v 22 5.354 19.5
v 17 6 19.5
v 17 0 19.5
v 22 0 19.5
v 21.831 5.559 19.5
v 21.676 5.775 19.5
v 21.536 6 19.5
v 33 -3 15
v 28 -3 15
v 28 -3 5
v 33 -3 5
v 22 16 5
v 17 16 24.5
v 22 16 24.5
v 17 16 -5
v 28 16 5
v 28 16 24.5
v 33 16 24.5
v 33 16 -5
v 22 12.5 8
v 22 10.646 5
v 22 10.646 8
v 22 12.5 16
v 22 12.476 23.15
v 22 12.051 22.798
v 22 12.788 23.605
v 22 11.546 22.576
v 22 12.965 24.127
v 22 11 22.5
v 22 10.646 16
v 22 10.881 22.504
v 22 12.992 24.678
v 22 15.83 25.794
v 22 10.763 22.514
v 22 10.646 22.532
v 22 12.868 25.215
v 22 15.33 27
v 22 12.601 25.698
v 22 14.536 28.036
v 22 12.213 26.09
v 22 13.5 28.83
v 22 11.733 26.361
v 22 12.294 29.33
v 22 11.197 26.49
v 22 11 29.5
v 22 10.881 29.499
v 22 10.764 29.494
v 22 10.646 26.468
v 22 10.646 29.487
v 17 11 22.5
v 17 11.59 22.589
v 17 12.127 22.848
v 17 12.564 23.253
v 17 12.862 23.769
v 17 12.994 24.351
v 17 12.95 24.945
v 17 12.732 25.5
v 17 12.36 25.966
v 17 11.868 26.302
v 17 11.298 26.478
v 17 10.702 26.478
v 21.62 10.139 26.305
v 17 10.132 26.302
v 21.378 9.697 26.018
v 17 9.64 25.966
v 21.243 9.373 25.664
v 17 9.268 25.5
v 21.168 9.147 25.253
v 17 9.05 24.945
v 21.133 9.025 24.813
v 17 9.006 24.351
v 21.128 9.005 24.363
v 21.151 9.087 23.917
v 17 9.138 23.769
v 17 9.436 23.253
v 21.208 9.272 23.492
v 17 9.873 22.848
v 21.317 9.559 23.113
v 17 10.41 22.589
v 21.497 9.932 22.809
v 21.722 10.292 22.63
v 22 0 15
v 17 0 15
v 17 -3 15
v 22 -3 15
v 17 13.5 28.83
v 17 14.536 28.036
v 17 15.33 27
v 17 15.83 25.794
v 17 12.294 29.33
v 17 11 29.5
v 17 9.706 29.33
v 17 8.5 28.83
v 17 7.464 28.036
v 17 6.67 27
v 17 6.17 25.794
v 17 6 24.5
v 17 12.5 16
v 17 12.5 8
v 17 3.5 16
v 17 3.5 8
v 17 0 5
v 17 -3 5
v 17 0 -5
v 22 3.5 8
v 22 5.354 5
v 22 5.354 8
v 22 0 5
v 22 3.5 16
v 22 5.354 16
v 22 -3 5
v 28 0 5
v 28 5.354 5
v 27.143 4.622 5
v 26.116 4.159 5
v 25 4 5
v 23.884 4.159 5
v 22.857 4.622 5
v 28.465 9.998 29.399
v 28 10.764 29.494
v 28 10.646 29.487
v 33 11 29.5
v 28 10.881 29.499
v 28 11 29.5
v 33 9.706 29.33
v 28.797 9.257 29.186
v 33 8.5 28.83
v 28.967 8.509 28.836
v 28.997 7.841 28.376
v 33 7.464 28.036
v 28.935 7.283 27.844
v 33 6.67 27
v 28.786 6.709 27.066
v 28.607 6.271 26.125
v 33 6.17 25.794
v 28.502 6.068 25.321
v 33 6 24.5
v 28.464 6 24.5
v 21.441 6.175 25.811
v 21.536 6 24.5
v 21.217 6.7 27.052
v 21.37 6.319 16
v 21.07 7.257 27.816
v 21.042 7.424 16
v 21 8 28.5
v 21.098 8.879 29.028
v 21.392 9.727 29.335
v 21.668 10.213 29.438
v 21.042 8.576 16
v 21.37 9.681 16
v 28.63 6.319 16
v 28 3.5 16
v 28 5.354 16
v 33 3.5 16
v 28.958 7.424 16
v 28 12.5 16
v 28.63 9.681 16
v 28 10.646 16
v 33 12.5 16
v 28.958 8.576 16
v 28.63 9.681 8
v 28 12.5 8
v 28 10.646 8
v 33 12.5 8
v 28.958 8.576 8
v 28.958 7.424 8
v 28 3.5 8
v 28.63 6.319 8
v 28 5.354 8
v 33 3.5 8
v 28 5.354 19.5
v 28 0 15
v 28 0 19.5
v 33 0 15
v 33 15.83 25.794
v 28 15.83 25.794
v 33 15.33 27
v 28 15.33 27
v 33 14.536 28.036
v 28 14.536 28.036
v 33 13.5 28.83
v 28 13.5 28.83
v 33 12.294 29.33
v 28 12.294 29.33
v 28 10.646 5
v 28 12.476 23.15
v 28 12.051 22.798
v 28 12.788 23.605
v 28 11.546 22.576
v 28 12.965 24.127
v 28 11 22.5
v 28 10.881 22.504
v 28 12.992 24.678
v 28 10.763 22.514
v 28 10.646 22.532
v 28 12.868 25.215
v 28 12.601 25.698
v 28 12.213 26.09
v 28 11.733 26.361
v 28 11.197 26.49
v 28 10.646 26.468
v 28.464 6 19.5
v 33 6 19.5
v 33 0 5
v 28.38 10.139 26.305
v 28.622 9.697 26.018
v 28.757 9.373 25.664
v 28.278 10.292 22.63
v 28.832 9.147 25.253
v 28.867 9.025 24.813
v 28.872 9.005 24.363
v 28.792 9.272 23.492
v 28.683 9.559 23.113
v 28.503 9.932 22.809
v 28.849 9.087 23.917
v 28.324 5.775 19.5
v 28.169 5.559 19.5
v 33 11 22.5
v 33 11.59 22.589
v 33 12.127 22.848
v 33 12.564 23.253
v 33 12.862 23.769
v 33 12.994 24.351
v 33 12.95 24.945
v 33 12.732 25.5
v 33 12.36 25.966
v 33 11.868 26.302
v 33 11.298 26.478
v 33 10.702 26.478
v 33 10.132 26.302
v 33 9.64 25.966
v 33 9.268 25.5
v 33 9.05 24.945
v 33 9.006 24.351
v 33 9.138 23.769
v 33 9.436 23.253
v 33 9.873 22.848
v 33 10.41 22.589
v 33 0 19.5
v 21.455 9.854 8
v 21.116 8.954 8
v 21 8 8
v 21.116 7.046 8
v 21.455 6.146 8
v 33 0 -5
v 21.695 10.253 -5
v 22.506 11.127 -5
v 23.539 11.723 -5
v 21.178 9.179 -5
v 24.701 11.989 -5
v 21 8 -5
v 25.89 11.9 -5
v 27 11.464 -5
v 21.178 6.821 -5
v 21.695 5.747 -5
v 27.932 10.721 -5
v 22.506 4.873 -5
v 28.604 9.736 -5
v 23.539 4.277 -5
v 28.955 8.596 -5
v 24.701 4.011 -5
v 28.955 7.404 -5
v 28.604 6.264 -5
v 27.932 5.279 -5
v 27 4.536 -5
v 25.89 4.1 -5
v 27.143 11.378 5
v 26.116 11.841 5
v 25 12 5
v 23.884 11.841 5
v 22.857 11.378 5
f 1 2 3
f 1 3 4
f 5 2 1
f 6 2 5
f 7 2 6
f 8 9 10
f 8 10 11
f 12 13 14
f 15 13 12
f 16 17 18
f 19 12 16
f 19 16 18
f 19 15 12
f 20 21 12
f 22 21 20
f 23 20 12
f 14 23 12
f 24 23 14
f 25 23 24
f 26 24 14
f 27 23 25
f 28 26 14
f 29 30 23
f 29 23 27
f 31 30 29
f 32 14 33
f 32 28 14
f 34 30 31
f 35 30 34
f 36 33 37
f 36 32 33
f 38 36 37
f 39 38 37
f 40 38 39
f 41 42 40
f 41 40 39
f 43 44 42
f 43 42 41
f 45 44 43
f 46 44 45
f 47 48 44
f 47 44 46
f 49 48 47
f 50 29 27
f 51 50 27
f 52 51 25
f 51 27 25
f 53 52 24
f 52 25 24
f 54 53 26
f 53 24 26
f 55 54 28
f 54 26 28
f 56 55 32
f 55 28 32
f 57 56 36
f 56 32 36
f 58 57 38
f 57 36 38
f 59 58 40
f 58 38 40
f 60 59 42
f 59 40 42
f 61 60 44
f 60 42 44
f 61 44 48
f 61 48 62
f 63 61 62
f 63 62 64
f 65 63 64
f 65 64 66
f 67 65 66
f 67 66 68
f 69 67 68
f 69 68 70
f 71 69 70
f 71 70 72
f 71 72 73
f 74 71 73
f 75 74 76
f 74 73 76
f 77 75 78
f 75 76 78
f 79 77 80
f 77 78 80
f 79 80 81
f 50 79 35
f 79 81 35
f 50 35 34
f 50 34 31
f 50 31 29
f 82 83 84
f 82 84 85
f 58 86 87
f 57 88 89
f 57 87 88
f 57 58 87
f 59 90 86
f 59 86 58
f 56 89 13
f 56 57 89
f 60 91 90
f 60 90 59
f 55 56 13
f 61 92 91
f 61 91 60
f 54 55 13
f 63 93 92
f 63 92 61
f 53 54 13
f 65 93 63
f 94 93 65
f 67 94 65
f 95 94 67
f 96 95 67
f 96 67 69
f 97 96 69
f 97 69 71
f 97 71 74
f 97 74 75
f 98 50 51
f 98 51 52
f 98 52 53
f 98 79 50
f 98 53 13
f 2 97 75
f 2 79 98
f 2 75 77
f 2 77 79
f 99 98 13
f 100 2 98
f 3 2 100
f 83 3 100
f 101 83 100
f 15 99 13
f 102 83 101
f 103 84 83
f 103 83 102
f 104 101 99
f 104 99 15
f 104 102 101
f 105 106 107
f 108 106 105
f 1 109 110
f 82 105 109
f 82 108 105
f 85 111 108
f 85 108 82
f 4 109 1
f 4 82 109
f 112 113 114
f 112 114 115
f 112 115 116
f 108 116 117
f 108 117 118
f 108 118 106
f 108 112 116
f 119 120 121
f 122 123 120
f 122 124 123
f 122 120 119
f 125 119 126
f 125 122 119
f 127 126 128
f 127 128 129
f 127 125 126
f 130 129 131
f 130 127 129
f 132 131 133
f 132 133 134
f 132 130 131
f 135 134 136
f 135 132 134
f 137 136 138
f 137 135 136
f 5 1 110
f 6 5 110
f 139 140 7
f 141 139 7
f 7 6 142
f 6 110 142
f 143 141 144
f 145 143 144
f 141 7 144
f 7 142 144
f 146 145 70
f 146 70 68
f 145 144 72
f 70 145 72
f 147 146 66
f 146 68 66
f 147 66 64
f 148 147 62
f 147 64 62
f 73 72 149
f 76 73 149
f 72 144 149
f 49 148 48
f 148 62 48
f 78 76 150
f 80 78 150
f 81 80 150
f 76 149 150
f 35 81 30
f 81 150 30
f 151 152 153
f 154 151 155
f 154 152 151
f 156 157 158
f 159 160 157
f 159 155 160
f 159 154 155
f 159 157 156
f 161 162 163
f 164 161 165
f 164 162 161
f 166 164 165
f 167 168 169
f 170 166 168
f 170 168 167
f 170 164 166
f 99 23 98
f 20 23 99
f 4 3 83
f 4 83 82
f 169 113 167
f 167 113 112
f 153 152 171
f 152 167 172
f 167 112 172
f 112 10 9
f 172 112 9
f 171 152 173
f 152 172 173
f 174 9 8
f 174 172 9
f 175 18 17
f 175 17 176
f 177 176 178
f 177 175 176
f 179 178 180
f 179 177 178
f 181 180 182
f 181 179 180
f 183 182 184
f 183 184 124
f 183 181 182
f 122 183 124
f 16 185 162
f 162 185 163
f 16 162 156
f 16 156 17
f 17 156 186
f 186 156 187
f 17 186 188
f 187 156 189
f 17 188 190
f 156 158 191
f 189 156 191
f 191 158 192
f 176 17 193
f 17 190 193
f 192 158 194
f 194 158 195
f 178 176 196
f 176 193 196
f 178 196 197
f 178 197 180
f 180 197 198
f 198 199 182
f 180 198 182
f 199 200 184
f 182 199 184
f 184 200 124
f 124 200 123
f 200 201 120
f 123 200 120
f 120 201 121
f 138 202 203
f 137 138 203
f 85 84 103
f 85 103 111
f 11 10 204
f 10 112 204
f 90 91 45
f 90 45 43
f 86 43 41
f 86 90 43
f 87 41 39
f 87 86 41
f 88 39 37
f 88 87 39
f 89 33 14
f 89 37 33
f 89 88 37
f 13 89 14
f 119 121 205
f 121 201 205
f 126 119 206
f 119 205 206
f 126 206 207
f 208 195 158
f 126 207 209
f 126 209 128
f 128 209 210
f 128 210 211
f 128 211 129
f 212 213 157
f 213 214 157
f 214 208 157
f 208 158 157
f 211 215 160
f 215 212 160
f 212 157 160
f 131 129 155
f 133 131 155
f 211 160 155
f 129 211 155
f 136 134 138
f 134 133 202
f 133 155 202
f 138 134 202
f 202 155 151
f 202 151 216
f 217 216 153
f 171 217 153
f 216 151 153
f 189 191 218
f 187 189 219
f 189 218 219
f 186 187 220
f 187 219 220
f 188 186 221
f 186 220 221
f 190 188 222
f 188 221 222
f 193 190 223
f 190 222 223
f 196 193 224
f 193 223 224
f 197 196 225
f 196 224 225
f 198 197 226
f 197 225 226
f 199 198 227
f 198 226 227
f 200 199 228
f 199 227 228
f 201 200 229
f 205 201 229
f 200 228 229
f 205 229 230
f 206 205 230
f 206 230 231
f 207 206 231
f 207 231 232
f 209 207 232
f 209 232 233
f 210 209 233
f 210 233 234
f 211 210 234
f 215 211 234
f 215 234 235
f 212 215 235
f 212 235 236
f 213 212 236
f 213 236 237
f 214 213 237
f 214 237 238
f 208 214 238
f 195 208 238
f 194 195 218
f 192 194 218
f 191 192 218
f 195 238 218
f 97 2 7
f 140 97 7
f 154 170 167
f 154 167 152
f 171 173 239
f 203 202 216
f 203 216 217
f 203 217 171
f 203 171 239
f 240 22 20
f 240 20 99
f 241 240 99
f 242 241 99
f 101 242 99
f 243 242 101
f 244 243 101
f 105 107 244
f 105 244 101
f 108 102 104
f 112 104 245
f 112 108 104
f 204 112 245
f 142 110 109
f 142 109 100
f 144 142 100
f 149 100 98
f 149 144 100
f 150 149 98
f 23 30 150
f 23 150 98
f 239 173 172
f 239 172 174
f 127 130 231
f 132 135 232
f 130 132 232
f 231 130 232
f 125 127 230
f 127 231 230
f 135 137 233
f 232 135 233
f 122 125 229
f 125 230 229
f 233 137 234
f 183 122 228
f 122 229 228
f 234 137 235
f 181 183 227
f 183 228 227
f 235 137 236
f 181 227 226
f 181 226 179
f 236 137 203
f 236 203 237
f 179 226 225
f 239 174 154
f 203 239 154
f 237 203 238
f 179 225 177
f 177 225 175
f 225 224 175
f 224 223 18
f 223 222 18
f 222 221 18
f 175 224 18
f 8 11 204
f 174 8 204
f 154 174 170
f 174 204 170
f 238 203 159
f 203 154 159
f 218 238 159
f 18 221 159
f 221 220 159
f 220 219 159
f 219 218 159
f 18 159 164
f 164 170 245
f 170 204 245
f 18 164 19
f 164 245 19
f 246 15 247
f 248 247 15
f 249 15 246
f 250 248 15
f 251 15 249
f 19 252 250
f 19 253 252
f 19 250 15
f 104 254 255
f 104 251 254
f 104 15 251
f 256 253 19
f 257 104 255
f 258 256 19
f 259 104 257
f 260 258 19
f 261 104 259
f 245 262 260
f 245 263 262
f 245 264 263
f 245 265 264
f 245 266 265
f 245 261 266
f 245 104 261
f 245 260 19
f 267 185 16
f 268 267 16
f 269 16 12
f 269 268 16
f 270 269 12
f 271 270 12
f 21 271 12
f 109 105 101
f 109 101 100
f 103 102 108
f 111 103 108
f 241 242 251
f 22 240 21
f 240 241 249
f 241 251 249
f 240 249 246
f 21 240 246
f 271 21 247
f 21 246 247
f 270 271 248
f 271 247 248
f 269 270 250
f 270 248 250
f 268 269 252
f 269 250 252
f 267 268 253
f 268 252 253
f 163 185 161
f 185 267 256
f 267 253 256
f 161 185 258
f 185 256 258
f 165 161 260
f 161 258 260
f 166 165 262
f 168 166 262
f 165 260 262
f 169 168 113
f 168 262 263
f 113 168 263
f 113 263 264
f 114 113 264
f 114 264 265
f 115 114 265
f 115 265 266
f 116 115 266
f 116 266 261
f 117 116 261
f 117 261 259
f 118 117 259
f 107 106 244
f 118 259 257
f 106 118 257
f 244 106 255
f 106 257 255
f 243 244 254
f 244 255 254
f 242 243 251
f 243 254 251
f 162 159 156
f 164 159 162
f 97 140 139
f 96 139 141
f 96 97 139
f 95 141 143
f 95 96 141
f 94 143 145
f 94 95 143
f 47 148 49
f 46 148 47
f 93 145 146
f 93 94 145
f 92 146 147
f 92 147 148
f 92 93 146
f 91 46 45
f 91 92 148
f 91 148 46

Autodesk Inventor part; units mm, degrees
ref_plane "YZ Plane" through (0, 0, 0) normal (1, 0, 0) x (0, 1, 0)
ref_plane "XZ Plane" through (0, 0, 0) normal (0, 1, 0) x (-1, 0, 0)
ref_plane "XY Plane" through (0, 0, 0) normal (0, 0, 1) x (1, 0, 0)
sketch "草图1" plane through (0, 0, 0) normal (0, 1, 0) x (-1, 0, 0)
  circle A0 centre (0, 0) radius 1.5
  line L0 (0, 0) -> (-50, 0) construction
  circle A1 centre (-50, 0) radius 1.5
  line L1 (5, -5) -> (-55, -5)
  line L2 (-55, -5) -> (-55, 5)
  line L3 (-55, 5) -> (5, 5)
  line L4 (5, 5) -> (5, -5)
  line L5 (-25, 0) -> (-25, -6.3237) construction
  dimension "d0" = 3
  dimension "d1" = 50
  dimension "d2" = 3
  dimension "d3" = 10
  dimension "d4" = 60
extrude "拉伸1" add sketch "草图1" along normal blind 6
sketch "草图2" plane through (0, 6, 0) normal (0, 1, 0) x (1, 0, 0)
  line L0 (-5, -5) -> (55, -5) projected
  line L1 (55, -5) -> (55, 5) projected
  line L2 (55, 5) -> (-5, 5) projected
  line L3 (-5, 5) -> (-5, -5) projected
  circle A0 centre (50, 0) radius 1.5 projected
  circle A1 centre (0, 0) radius 1.5 projected
  line L4 (55, 5) -> (-5, 5) projected
  line L5 (-5, -5) -> (55, -5) projected
  line L6 (17, 5) -> (22, 5)
  line L7 (22, 5) -> (22, -5)
  line L8 (22, -5) -> (17, -5)
  line L9 (17, -5) -> (17, 5)
  line L10 (28, 5) -> (33, 5)
  line L11 (33, 5) -> (33, -5)
  line L12 (33, -5) -> (28, -5)
  line L13 (28, -5) -> (28, 5)
  line L14 (25, -5) -> (25, 2.8466) construction
  line L15 (17, -5) -> (22, -5)
  line L16 (22, -5) -> (22, -29.5)
  line L17 (22, -29.5) -> (17, -29.5)
  line L18 (17, -29.5) -> (17, -5)
  line L19 (33, -5) -> (28, -5)
  line L20 (28, -5) -> (28, -29.5)
  line L21 (28, -29.5) -> (33, -29.5)
  line L22 (33, -29.5) -> (33, -5)
  point P0 (28, 5)
  point P1 (28, -5)
  point P2 (33, -5)
  point P3 (33, 5)
  point P4 (17, 5)
  point P5 (22, 5)
  point P6 (33, -5)
  dimension "d7" = 5
  dimension "d8" = 6
  dimension "d24" = 24.5
extrude "拉伸2" add sketch "草图2" along normal blind 10 contours L9 L2 L7 L0 | L0 L16 L17 L18 | L7 L2 L13 L0 | L13 L2 L11 L0 | L0 L22 L21 L20
chamfer "倒角1" distance 2 angle 45 2 edges at (1.5, 6, 0) (51.5, 6, 0)
sketch "草图4" plane through (33, 6, 29.5) normal (1, 0, 0) x (0, 0, -1)
  circle A0 centre (5, 5) radius 2
  line L0 (0, 0) -> (0, 10) projected
  line L1 (0, 5) -> (5, 5)
  point P0 (29.5, -6)
  dimension "d25" = 4
  dimension "d26" = 5
extrude "拉伸4" cut sketch "草图4" against normal through all
fillet "圆角7" radius 5 4 edges at (30.5, 16, 29.5) (19.5, 16, 29.5) (19.5, 6, 29.5) (30.5, 6, 29.5)
sketch "草图5" plane through (0, 6, 0) normal (0, -1, 0) x (1, 0, 0)
  line L0 (17, 24.5) -> (22, 24.5) projected
  line L1 (17, 5) -> (17, 24.5) projected
  line L2 (17, 5) -> (22, 5) projected
  line L3 (22, 24.5) -> (22, 5) projected
  line L4 (28, 24.5) -> (33, 24.5) projected
  line L5 (28, 5) -> (28, 24.5) projected
  line L6 (28, 5) -> (33, 5) projected
  line L7 (33, 24.5) -> (33, 5) projected
  line L8 (17, 19.5) -> (33, 19.5)
  line L9 (33, 24.5) -> (33, 5) projected
  line L10 (-5, 5) -> (55, 5) projected
  point P0 (0, 0)
  point P1 (22, 19.5)
  point P2 (28, 19.5)
  dimension "d30" = 14.5
extrude "拉伸5" add sketch "草图5" along normal blind 6 contours L8 L3 L2 L1 | L8 L7 L6 L5
sketch "草图6" plane through (0, 0, 0) normal (0, -1, 0) x (1, 0, 0)
  line L0 (-5, 5) -> (17, 5) projected
  line L1 (-5, -5) -> (-5, 5) projected
  line L2 (55, -5) -> (-5, -5) projected
  line L3 (55, 5) -> (55, -5) projected
  line L4 (33, 5) -> (55, 5) projected
  line L5 (33, 5) -> (33, 19.5) projected
  line L6 (33, 19.5) -> (28, 19.5) projected
  line L7 (28, 19.5) -> (28, 5) projected
  line L8 (22, 5) -> (28, 5) projected
  line L9 (22, 5) -> (22, 19.5) projected
  line L10 (22, 19.5) -> (17, 19.5) projected
  line L11 (17, 19.5) -> (17, 5) projected
  circle A0 centre (50, 0) radius 1.5 projected
  circle A1 centre (0, 0) radius 1.5 projected
  line L12 (17, 19.5) -> (17, 5) projected
  line L13 (17, 15) -> (33, 15)
  line L14 (33, 5) -> (33, 19.5) projected
  line L15 (17, 5) -> (33, 5)
  point P0 (28, 15)
  point P1 (22, 15)
  dimension "d34" = 10
extrude "拉伸6" add sketch "草图6" along normal blind 3 contours L11 L13 L9 L15 | L7 L13 L5 L15
ref_plane "工作平面1" through (33, 11, 24.5) normal (1, 0, 0) x (0, 0, -1)
sketch "草图7" plane through (33, 11, 24.5) normal (1, 0, 0) x (0, 0, -1)
  circle A0 centre (0, 0) radius 2 projected
  line L0 (8.5, 1.5) -> (16.5, 1.5)
  line L1 (16.5, 1.5) -> (16.5, -7.5)
  line L2 (16.5, -7.5) -> (8.5, -7.5)
  line L3 (8.5, -7.5) -> (8.5, 1.5)
  point P0 (24.5, -11)
  dimension "d43" = 8
  dimension "d44" = 9
extrude "拉伸7" cut sketch "草图7" against normal through all contours L0 L1 L2 L3
sketch "草图8" plane through (55, 0, -5) normal (0, 0, -1) x (-1, 0, 0)
  line L0 (0, 0) -> (60, 0) projected
  line L1 (60, 0) -> (60, 6) projected
  line L2 (38, 6) -> (60, 6) projected
  line L3 (38, 6) -> (38, 16) projected
  line L4 (22, 16) -> (38, 16) projected
  line L5 (22, 6) -> (22, 16) projected
  line L6 (0, 6) -> (22, 6) projected
  line L7 (0, 0) -> (0, 6) projected
  line L8 (22, 6) -> (22, 16) projected
  line L9 (38, 0) -> (38, -3) projected
  line L10 (22, 16) -> (38, 16)
  line L11 (38, 16) -> (38, 0)
  line L12 (38, 0) -> (22, 0)
  line L13 (22, 0) -> (22, 16)
  circle A0 centre (30, 8) radius 4
  line L14 (30, 8) -> (30, 0) construction
  line L15 (30, 8) -> (22, 8) construction
  line L16 (0, 0) -> (60, 0) projected
  point P0 (55, 0)
  dimension "d50" = 8
extrude "拉伸8" cut sketch "草图8" against normal through all contours L7 L6 L13 L0 | L11 L2 L1 L0 | A0
properties part number "合页01"
